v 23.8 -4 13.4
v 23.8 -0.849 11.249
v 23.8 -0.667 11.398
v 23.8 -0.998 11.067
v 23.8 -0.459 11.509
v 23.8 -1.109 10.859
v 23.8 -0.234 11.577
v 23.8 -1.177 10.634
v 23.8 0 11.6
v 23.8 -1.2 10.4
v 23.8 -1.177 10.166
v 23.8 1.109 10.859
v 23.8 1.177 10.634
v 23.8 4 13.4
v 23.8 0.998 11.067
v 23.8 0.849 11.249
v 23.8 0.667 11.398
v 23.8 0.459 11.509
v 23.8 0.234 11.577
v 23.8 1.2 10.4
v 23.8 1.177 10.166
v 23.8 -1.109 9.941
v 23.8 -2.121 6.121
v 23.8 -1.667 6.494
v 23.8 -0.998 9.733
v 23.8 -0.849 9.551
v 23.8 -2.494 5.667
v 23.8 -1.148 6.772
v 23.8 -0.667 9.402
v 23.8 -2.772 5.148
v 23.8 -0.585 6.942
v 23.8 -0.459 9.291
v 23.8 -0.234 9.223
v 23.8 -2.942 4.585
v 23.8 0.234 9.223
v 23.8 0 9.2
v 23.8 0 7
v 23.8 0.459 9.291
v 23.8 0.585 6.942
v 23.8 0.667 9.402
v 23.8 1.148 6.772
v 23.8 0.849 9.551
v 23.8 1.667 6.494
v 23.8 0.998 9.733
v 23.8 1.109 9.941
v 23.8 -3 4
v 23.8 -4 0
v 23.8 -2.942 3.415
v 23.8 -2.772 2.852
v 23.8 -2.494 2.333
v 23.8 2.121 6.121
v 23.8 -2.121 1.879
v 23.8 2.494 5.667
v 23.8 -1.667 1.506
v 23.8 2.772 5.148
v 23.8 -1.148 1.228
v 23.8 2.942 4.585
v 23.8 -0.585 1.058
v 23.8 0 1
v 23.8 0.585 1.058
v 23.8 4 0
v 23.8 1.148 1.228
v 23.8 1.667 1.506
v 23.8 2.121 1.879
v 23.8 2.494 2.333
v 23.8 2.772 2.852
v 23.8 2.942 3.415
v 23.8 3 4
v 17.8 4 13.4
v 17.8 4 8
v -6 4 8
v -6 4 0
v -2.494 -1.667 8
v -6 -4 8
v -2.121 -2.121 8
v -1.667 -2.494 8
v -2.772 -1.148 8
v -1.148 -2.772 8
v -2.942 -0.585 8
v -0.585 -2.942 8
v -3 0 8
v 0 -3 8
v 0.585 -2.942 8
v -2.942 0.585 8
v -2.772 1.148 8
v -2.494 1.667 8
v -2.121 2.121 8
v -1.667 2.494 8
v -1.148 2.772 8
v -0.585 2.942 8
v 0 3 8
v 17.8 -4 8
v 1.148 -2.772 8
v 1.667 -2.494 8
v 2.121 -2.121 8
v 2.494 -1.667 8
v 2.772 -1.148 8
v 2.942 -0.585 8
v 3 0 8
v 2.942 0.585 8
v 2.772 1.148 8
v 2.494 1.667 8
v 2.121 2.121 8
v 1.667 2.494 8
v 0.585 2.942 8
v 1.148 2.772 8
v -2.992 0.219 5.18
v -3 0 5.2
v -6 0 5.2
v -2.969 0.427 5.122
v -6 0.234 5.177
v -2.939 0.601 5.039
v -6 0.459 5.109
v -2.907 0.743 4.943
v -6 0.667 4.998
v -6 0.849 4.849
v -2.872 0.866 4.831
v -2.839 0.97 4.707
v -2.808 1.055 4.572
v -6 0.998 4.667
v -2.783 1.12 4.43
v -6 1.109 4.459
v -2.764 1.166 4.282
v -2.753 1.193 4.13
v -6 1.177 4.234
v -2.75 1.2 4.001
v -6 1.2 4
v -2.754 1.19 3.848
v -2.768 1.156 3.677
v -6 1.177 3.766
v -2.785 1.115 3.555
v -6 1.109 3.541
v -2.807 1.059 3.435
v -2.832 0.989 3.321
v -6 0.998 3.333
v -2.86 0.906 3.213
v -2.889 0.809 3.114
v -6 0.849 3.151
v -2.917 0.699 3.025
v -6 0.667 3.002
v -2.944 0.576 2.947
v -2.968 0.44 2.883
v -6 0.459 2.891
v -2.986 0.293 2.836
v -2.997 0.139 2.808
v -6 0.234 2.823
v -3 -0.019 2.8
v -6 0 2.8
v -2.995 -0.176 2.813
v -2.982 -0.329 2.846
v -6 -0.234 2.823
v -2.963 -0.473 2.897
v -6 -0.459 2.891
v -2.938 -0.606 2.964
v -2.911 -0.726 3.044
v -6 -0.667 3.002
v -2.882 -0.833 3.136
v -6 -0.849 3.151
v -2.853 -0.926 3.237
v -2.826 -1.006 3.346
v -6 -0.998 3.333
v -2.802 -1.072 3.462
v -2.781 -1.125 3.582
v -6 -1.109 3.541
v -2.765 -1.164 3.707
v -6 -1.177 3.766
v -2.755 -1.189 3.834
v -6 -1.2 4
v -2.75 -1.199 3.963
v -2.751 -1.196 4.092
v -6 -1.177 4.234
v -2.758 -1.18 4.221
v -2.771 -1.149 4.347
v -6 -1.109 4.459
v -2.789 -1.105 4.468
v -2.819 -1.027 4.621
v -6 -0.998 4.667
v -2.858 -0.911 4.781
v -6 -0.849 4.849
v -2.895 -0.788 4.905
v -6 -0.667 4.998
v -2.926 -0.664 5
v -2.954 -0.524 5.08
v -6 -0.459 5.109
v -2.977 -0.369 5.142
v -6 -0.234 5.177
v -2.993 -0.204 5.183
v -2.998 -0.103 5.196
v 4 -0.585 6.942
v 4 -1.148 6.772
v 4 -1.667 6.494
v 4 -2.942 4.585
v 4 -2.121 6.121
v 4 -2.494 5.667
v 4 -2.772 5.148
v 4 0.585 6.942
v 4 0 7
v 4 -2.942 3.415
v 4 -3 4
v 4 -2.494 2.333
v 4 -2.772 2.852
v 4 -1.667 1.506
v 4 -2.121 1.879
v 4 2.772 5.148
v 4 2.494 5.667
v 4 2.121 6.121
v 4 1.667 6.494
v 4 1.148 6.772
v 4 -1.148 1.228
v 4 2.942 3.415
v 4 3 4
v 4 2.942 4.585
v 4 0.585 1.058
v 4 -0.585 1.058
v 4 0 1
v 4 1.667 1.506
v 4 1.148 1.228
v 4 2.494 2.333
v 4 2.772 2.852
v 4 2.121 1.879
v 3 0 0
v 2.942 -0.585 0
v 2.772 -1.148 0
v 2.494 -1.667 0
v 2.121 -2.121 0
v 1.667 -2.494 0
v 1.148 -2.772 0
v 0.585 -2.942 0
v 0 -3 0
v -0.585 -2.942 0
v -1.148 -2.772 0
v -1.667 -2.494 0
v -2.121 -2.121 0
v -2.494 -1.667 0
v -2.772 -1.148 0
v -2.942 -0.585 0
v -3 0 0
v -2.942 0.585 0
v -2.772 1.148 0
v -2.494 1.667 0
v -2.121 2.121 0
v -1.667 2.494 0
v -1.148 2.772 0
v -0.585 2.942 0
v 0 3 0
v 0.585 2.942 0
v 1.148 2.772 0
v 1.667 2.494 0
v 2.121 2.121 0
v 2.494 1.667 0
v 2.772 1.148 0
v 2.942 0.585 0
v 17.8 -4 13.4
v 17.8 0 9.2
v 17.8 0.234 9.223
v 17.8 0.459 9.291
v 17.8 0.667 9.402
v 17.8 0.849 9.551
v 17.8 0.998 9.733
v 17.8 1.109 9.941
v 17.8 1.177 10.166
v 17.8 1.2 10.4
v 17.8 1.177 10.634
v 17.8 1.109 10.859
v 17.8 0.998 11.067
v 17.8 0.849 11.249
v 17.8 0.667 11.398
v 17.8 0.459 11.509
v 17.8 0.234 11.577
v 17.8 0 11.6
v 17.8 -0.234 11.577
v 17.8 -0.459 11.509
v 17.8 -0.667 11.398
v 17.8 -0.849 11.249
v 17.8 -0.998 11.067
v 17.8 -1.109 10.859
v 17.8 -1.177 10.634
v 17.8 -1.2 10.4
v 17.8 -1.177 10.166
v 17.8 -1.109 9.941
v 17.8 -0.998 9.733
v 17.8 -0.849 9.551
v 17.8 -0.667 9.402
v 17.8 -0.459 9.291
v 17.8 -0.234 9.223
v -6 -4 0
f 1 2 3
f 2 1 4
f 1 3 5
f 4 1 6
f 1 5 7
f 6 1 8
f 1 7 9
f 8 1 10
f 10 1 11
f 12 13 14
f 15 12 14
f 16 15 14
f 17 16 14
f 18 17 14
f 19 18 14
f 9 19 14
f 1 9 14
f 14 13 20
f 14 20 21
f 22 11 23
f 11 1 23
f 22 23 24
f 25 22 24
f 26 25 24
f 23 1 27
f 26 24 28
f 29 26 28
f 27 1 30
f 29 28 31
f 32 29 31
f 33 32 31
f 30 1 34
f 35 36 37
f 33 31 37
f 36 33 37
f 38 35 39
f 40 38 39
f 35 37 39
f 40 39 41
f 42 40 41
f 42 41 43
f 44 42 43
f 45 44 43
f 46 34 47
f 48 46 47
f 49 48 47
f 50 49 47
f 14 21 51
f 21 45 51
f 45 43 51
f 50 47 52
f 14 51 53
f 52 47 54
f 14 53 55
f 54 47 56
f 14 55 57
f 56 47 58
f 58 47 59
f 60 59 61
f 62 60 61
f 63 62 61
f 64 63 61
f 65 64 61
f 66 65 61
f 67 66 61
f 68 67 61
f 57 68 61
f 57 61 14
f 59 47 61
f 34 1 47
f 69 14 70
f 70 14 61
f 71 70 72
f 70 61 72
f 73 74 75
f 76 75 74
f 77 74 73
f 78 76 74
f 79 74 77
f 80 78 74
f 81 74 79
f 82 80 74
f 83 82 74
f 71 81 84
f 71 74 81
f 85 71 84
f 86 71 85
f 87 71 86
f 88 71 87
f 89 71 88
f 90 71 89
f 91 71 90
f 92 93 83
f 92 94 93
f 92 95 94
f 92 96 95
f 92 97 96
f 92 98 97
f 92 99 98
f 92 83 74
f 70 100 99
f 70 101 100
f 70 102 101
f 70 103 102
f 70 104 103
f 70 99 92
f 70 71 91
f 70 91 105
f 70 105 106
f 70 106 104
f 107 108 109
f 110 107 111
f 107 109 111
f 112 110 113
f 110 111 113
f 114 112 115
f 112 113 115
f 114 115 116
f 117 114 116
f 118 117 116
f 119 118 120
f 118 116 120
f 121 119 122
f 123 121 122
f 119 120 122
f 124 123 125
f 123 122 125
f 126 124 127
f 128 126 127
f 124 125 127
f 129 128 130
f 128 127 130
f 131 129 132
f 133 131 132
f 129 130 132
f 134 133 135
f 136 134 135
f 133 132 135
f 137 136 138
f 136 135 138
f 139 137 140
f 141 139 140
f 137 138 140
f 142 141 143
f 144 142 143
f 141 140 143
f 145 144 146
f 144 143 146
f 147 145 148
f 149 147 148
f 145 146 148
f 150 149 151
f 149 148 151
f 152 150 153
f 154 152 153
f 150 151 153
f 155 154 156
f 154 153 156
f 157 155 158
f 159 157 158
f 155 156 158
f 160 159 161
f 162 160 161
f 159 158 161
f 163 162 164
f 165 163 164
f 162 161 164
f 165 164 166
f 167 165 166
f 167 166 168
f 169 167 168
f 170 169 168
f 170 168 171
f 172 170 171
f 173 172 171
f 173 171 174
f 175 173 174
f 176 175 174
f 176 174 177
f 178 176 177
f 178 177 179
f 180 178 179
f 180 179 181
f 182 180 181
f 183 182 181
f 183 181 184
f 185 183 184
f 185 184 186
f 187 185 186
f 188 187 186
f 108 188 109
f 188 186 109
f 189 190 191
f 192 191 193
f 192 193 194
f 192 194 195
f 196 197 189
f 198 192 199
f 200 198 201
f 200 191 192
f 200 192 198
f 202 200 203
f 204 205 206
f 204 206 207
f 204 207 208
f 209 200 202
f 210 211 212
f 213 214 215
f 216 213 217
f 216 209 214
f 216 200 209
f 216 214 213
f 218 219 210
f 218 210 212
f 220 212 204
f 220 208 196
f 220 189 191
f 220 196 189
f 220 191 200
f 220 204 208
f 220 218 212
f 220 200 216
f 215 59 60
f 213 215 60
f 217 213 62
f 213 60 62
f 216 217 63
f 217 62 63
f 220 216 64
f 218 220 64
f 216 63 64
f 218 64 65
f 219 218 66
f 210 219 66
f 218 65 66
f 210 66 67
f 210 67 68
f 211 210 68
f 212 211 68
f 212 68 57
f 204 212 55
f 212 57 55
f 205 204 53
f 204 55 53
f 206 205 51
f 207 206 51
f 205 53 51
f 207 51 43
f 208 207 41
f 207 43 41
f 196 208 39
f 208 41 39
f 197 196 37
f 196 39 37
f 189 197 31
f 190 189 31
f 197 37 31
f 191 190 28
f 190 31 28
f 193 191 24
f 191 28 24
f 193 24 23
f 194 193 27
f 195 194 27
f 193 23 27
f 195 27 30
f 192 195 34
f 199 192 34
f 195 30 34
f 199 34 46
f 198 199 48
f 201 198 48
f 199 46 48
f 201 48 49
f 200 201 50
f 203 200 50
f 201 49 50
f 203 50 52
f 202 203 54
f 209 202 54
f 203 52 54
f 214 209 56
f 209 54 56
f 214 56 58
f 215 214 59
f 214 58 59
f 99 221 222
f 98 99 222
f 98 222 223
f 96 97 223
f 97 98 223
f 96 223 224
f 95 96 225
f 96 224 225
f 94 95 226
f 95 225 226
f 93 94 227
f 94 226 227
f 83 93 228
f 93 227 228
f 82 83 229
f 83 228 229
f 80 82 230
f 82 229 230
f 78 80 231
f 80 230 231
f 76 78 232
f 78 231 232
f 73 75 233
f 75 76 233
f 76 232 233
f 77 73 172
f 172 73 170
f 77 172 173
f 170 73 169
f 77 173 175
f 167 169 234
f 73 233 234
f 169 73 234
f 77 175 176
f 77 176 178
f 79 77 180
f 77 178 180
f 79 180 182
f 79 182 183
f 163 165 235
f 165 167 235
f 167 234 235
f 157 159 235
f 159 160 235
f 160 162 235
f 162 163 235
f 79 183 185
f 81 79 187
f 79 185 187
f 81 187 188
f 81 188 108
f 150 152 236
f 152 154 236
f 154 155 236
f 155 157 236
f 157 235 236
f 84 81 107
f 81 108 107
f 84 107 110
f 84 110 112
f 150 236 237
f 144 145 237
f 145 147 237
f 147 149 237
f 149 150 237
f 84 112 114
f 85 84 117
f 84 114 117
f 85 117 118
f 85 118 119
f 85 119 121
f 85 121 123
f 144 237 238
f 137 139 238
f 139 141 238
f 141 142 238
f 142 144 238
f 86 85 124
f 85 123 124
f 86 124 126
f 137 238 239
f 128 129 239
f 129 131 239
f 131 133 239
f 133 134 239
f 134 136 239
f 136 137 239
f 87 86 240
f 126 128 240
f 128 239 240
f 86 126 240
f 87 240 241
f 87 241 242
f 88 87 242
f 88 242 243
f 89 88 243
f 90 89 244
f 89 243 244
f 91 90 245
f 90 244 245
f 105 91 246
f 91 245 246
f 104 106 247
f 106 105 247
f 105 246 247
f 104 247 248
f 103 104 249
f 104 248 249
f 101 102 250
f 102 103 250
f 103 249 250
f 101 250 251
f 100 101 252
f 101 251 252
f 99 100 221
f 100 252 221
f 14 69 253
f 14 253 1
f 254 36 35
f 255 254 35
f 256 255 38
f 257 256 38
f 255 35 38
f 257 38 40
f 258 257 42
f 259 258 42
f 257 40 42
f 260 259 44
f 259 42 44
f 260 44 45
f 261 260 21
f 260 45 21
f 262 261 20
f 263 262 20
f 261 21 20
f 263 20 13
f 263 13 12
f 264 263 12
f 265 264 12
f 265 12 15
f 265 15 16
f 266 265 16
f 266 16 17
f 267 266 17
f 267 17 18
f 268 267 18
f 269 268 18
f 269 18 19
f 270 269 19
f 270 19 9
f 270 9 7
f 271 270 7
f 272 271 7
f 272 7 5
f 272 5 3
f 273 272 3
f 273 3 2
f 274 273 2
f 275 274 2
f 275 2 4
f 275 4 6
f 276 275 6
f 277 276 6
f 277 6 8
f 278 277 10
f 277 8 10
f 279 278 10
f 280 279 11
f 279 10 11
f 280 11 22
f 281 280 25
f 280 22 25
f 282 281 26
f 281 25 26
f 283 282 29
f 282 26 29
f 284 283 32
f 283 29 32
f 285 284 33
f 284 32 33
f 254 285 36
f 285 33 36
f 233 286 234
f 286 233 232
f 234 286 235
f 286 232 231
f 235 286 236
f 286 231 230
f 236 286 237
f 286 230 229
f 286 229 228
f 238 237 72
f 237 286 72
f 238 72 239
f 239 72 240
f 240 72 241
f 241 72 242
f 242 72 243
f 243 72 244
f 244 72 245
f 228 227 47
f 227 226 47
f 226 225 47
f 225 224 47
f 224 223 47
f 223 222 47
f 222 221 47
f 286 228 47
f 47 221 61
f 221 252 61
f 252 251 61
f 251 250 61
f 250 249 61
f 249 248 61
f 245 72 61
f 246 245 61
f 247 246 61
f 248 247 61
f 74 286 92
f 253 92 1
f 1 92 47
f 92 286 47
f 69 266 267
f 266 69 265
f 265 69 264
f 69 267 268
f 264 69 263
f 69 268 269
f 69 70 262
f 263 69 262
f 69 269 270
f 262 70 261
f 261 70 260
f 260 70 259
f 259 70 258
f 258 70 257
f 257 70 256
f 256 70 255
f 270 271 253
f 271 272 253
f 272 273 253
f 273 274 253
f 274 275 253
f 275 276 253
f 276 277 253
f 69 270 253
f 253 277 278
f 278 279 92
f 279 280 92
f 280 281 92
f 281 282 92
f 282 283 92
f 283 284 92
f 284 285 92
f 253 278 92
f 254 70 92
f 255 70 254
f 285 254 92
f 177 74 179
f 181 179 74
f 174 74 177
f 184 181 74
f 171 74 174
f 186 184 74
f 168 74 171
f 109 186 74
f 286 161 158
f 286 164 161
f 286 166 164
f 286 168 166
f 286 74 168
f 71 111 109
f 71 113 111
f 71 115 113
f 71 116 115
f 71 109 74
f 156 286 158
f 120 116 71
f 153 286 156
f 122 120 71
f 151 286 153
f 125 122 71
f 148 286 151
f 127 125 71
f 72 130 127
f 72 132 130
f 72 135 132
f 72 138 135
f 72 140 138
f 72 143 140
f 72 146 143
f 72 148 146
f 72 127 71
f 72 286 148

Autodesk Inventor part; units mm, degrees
ref_plane "YZ Plane" through (0, 0, 0) normal (1, 0, 0) x (0, 1, 0)
ref_plane "XZ Plane" through (0, 0, 0) normal (0, 1, 0) x (-1, 0, 0)
ref_plane "XY Plane" through (0, 0, 0) normal (0, 0, 1) x (1, 0, 0)
sketch "Sketch1" plane through (0, 0, 0) normal (0, 0, 1) x (1, 0, 0)
  circle A0 centre (0, 0) radius 3 projected
  line L0 (6, -4) -> (-6, -4)
  line L1 (-6, -4) -> (-6, 4)
  line L2 (-6, 4) -> (6, 4)
  line L3 (6, 4) -> (6, -4)
  line L4 (6, -4) -> (-6, 4) construction
  line L5 (-6, -4) -> (6, 4) construction
  line L6 (6, 4) -> (23.8, 4)
  line L7 (23.8, 4) -> (23.8, -4)
  line L8 (23.8, -4) -> (6, -4)
  line L9 (6, -4) -> (6, 4)
  point P0 (0, 0)
  dimension "d0" = 12
  dimension "d1" = 8
  dimension "d2" = 17.8
extrude "Extrusion1" add sketch "Sketch1" along normal blind 8
sketch "Sketch2" plane through (23.8, -4, 0) normal (1, 0, 0) x (0, 0, -1)
  circle A0 centre (-4, 4) radius 3
  point P0 (0, 4)
  dimension "d5" = 6
extrude "Extrusion2" cut sketch "Sketch2" against normal blind 19.8
sketch "Sketch3" plane through (-6, -4, 0) normal (-1, 0, 0) x (0, 0, 1)
  circle A0 centre (4, 4) radius 1.2
  point P0 (0, 4)
  dimension "d8" = 2.4
extrude "Extrusion3" cut sketch "Sketch3" against normal blind 4
thread "Thread1" size "M3x0.5" class "6H" standard "ANSI Metric M Profile" full length
sketch "Sketch5" plane through (0, 0, 8) normal (0, 0, 1) x (1, 0, 0)
  line L0 (23.8, 4) -> (-6, 4) projected
  line L1 (-6, -4) -> (23.8, -4) projected
  line L2 (23.8, -4) -> (23.8, 4) projected
  line L3 (17.8, 4) -> (17.8, -4)
  dimension "d20" = 6
extrude "Extrusion5" add sketch "Sketch5" along normal blind 5.4
sketch "Sketch6" plane through (23.8, -4, 0) normal (1, 0, 0) x (0, 0, -1)
  line L0 (-13.4, 0) -> (-13.4, 8) projected
  circle A0 centre (-10.4, 4) radius 1.2
  point P0 (0, 4)
  dimension "d23" = 2.4
  dimension "d24" = 3
extrude "Extrusion6" cut sketch "Sketch6" against normal blind 10
thread "Thread3" size "M3x0.5" class "6H" standard "ANSI Metric M Profile" full length
properties material "Copper"
